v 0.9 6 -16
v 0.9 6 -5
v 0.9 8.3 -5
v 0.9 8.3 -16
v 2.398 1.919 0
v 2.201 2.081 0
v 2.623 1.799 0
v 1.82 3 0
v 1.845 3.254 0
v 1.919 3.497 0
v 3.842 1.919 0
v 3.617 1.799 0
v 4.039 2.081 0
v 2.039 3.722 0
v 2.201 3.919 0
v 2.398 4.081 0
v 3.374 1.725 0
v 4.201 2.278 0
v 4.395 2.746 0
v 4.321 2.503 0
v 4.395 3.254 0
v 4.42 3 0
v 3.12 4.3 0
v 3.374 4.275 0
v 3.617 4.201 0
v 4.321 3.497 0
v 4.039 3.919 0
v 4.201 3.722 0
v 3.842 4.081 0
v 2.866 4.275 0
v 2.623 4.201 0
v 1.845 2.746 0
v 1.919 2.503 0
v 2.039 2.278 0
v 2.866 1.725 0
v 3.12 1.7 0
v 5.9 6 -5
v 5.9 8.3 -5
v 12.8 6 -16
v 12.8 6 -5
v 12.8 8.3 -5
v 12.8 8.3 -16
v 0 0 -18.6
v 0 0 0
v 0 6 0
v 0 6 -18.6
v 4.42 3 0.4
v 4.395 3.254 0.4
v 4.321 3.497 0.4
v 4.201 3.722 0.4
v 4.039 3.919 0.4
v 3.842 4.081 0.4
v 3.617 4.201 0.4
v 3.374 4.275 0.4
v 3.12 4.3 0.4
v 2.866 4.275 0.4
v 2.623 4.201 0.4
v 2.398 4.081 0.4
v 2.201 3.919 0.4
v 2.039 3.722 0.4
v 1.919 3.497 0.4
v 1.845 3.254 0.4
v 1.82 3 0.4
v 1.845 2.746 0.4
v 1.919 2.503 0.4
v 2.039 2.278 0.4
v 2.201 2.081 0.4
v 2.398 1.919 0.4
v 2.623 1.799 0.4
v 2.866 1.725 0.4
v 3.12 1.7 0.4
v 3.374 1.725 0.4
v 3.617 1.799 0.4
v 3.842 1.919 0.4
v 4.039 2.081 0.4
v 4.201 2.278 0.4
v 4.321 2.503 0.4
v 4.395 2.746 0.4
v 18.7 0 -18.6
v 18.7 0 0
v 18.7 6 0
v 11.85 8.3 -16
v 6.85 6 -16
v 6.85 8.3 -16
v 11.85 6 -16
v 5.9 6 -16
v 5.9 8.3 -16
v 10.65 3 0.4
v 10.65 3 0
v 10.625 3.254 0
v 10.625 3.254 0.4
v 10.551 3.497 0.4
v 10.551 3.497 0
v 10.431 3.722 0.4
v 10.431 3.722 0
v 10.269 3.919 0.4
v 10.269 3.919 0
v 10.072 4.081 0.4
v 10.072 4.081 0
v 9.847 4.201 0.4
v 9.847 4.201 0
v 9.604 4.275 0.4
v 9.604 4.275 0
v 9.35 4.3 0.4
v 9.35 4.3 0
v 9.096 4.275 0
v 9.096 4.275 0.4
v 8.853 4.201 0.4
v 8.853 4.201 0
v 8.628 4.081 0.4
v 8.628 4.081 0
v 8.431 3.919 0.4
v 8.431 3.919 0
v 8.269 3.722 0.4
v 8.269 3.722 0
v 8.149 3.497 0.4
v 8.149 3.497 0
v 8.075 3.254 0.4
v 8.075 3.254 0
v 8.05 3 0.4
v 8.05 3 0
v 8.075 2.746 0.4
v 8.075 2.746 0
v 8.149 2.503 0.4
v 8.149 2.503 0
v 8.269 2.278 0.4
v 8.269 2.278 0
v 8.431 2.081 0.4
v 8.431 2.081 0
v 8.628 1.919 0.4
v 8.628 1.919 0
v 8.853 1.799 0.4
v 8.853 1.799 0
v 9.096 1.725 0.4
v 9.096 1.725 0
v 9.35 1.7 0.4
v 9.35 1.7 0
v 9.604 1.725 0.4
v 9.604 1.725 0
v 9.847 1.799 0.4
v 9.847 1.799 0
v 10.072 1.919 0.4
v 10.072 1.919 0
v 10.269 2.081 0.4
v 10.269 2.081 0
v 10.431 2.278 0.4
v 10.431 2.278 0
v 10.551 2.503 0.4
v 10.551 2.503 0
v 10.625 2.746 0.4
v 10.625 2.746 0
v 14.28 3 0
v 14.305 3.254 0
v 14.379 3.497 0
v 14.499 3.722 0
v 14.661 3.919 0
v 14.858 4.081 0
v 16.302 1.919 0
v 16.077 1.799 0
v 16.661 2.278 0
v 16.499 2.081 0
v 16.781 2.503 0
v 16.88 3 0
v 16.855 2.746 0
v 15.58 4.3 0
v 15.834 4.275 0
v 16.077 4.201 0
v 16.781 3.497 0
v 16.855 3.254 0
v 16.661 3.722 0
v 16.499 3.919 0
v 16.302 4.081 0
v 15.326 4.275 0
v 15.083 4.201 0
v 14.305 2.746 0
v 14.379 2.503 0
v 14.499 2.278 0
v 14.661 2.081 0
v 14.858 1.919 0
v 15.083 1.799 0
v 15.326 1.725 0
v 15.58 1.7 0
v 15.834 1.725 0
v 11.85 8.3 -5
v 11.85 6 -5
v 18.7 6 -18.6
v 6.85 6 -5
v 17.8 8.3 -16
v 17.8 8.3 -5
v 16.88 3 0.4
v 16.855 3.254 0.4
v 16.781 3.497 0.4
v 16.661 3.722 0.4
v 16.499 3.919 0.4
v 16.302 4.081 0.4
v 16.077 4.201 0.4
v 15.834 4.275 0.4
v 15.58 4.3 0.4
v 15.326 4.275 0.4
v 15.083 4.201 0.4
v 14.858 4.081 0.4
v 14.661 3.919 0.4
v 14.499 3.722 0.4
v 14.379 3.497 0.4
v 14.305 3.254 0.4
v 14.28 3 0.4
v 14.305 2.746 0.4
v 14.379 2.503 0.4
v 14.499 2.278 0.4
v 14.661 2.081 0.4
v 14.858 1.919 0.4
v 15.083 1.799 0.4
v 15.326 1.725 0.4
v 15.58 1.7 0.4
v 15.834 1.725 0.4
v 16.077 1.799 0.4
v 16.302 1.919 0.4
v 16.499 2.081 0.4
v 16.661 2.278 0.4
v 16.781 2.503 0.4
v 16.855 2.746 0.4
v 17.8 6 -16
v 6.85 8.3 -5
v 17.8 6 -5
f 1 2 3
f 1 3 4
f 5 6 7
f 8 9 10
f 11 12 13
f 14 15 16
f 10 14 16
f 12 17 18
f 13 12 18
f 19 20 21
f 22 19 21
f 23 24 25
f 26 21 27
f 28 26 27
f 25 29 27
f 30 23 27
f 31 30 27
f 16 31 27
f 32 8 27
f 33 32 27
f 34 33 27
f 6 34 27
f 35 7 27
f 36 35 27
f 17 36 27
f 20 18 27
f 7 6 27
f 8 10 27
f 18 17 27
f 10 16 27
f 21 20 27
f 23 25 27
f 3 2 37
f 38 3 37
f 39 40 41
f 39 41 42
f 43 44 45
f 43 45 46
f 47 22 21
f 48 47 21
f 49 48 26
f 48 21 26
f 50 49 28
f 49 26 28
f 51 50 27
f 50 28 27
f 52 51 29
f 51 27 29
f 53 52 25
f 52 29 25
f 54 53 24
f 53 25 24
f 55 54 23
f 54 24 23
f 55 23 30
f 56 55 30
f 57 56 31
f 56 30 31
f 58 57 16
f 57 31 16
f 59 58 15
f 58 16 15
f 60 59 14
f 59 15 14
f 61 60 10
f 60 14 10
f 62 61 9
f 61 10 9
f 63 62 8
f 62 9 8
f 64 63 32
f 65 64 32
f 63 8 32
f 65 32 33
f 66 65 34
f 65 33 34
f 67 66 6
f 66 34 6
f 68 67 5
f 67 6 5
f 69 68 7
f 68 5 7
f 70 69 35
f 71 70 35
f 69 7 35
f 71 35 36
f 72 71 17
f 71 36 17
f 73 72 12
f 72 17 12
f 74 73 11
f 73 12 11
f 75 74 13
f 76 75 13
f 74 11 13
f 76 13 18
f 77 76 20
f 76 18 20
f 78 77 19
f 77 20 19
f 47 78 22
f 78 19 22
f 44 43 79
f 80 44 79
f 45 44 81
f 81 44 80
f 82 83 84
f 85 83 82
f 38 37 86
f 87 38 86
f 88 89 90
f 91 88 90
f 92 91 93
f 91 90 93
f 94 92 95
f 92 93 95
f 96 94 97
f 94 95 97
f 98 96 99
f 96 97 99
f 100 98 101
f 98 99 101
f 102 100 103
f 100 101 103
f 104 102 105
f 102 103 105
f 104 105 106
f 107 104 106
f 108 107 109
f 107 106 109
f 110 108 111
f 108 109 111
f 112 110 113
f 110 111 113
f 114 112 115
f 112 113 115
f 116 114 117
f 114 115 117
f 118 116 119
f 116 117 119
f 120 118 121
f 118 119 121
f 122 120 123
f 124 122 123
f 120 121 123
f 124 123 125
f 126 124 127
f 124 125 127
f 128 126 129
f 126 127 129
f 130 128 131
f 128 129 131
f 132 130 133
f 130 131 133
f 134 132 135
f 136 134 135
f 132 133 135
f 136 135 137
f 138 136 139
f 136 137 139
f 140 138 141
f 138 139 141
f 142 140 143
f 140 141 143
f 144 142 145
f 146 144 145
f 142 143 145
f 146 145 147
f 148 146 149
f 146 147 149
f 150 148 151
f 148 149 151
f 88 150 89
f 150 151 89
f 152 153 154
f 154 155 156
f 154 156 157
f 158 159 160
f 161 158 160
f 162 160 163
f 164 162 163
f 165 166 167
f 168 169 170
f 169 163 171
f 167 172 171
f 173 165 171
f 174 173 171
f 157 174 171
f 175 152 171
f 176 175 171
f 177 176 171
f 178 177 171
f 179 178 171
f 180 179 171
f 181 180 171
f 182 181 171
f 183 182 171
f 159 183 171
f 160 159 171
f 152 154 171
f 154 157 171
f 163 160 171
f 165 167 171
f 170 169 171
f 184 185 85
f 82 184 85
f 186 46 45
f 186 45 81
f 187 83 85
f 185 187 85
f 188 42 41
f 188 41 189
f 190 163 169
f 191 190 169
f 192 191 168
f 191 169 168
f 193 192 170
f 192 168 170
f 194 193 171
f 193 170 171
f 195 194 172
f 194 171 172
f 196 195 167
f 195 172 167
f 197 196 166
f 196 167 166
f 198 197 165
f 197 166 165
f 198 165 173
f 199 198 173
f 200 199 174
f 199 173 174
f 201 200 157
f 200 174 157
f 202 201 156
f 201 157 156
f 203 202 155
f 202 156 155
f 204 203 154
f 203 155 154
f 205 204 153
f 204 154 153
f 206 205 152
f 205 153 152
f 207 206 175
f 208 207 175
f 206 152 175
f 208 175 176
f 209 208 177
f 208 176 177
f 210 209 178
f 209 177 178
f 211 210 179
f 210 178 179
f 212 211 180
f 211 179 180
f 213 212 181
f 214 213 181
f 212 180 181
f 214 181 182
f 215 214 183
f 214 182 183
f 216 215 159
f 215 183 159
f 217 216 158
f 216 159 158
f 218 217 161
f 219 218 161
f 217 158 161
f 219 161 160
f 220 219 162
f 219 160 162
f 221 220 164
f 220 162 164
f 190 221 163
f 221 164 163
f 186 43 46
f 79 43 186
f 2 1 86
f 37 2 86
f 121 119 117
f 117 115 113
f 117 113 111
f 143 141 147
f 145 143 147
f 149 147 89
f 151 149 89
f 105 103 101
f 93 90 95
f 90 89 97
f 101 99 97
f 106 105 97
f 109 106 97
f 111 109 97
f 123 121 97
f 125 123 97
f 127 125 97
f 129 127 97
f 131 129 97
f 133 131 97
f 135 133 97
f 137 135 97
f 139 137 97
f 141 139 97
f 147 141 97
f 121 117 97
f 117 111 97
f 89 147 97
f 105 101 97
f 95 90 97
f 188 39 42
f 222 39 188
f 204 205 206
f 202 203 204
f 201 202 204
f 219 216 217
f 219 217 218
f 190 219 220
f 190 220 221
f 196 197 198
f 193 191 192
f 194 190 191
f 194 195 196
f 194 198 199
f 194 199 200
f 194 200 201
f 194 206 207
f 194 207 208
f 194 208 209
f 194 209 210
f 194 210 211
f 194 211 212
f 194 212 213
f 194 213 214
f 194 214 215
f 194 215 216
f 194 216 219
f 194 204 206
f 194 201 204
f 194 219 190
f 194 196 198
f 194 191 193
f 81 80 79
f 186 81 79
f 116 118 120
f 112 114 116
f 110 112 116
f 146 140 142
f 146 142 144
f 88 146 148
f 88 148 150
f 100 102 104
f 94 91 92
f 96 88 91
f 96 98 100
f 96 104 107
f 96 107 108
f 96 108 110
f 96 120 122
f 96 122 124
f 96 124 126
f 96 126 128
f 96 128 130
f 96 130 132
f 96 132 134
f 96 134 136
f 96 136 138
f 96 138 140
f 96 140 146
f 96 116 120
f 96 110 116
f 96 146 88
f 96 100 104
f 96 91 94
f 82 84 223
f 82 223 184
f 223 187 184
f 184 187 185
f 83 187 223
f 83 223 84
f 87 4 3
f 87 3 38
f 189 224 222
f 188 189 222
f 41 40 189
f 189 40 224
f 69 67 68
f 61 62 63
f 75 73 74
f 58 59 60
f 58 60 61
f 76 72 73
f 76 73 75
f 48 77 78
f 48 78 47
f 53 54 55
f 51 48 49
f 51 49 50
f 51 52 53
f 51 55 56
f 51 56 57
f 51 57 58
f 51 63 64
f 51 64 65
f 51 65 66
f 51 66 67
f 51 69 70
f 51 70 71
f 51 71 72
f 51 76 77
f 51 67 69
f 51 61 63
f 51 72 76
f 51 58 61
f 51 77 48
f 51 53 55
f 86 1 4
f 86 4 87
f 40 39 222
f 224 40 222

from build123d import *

# Parameters (mm, degrees)
SK_HOUSING_W         = 18.7
SK_HOUSING_H         = 18.6
HOUSING_DEPTH        = 6
LEVERS_START         = 6
SK_LEVERS_W          = 5
SK_LEVERS_H          = 11
LEVERS_DEPTH         = 2.3
LEVERS_2_DEPTH       = 2.3
LEVERS_3_DEPTH       = 2.3
SK_WIRE_ENTRIES_R    = 1.3
WIRE_ENTRIES_DEPTH   = 0.4
WIRE_ENTRIES_2_DEPTH = 0.4
WIRE_ENTRIES_3_DEPTH = 0.4


with BuildPart() as part:
    # SK Housing → Housing (new body)
    with BuildSketch(Plane(origin=(0, 0, 0), x_dir=(1, 0, 0), z_dir=(0, 1, 0))):
        with Locations((9.35, 9.3)):
            Rectangle(SK_HOUSING_W, SK_HOUSING_H)
    extrude(amount=HOUSING_DEPTH)


with BuildPart() as body_2:
    # SK Levers → Levers (new body)
    with BuildSketch(Plane(origin=(0, 0, 0), x_dir=(1, 0, 0), z_dir=(0, 1, 0)).offset(LEVERS_START)):
        with Locations((3.4, 10.5)):
            Rectangle(SK_LEVERS_W, SK_LEVERS_H)
    extrude(amount=LEVERS_DEPTH)


with BuildPart() as body_3:
    # SK Levers → Levers 2 (new body)
    with BuildSketch(Plane(origin=(0, 0, 0), x_dir=(1, 0, 0), z_dir=(0, 1, 0)).offset(LEVERS_START)):
        with Locations((9.35, 10.5)):
            Rectangle(SK_LEVERS_W, SK_LEVERS_H)
    extrude(amount=LEVERS_2_DEPTH)


with BuildPart() as body_4:
    # SK Levers → Levers 3 (new body)
    with BuildSketch(Plane(origin=(0, 0, 0), x_dir=(1, 0, 0), z_dir=(0, 1, 0)).offset(LEVERS_START)):
        with Locations((15.3, 10.5)):
            Rectangle(SK_LEVERS_W, SK_LEVERS_H)
    extrude(amount=LEVERS_3_DEPTH)


with BuildPart() as body_5:
    # SK Wire entries → Wire entries (new body)
    with BuildSketch(Plane.XY):
        with Locations((3.12, 3)):
            Circle(SK_WIRE_ENTRIES_R)
    extrude(amount=WIRE_ENTRIES_DEPTH)


with BuildPart() as body_6:
    # SK Wire entries → Wire entries 2 (new body)
    with BuildSketch(Plane.XY):
        with Locations((9.35, 3)):
            Circle(SK_WIRE_ENTRIES_R)
    extrude(amount=WIRE_ENTRIES_2_DEPTH)


with BuildPart() as body_7:
    # SK Wire entries → Wire entries 3 (new body)
    with BuildSketch(Plane.XY):
        with Locations((15.58, 3)):
            Circle(SK_WIRE_ENTRIES_R)
    extrude(amount=WIRE_ENTRIES_3_DEPTH)


solid = Compound([part.part, body_2.part, body_3.part, body_4.part, body_5.part, body_6.part, body_7.part])
